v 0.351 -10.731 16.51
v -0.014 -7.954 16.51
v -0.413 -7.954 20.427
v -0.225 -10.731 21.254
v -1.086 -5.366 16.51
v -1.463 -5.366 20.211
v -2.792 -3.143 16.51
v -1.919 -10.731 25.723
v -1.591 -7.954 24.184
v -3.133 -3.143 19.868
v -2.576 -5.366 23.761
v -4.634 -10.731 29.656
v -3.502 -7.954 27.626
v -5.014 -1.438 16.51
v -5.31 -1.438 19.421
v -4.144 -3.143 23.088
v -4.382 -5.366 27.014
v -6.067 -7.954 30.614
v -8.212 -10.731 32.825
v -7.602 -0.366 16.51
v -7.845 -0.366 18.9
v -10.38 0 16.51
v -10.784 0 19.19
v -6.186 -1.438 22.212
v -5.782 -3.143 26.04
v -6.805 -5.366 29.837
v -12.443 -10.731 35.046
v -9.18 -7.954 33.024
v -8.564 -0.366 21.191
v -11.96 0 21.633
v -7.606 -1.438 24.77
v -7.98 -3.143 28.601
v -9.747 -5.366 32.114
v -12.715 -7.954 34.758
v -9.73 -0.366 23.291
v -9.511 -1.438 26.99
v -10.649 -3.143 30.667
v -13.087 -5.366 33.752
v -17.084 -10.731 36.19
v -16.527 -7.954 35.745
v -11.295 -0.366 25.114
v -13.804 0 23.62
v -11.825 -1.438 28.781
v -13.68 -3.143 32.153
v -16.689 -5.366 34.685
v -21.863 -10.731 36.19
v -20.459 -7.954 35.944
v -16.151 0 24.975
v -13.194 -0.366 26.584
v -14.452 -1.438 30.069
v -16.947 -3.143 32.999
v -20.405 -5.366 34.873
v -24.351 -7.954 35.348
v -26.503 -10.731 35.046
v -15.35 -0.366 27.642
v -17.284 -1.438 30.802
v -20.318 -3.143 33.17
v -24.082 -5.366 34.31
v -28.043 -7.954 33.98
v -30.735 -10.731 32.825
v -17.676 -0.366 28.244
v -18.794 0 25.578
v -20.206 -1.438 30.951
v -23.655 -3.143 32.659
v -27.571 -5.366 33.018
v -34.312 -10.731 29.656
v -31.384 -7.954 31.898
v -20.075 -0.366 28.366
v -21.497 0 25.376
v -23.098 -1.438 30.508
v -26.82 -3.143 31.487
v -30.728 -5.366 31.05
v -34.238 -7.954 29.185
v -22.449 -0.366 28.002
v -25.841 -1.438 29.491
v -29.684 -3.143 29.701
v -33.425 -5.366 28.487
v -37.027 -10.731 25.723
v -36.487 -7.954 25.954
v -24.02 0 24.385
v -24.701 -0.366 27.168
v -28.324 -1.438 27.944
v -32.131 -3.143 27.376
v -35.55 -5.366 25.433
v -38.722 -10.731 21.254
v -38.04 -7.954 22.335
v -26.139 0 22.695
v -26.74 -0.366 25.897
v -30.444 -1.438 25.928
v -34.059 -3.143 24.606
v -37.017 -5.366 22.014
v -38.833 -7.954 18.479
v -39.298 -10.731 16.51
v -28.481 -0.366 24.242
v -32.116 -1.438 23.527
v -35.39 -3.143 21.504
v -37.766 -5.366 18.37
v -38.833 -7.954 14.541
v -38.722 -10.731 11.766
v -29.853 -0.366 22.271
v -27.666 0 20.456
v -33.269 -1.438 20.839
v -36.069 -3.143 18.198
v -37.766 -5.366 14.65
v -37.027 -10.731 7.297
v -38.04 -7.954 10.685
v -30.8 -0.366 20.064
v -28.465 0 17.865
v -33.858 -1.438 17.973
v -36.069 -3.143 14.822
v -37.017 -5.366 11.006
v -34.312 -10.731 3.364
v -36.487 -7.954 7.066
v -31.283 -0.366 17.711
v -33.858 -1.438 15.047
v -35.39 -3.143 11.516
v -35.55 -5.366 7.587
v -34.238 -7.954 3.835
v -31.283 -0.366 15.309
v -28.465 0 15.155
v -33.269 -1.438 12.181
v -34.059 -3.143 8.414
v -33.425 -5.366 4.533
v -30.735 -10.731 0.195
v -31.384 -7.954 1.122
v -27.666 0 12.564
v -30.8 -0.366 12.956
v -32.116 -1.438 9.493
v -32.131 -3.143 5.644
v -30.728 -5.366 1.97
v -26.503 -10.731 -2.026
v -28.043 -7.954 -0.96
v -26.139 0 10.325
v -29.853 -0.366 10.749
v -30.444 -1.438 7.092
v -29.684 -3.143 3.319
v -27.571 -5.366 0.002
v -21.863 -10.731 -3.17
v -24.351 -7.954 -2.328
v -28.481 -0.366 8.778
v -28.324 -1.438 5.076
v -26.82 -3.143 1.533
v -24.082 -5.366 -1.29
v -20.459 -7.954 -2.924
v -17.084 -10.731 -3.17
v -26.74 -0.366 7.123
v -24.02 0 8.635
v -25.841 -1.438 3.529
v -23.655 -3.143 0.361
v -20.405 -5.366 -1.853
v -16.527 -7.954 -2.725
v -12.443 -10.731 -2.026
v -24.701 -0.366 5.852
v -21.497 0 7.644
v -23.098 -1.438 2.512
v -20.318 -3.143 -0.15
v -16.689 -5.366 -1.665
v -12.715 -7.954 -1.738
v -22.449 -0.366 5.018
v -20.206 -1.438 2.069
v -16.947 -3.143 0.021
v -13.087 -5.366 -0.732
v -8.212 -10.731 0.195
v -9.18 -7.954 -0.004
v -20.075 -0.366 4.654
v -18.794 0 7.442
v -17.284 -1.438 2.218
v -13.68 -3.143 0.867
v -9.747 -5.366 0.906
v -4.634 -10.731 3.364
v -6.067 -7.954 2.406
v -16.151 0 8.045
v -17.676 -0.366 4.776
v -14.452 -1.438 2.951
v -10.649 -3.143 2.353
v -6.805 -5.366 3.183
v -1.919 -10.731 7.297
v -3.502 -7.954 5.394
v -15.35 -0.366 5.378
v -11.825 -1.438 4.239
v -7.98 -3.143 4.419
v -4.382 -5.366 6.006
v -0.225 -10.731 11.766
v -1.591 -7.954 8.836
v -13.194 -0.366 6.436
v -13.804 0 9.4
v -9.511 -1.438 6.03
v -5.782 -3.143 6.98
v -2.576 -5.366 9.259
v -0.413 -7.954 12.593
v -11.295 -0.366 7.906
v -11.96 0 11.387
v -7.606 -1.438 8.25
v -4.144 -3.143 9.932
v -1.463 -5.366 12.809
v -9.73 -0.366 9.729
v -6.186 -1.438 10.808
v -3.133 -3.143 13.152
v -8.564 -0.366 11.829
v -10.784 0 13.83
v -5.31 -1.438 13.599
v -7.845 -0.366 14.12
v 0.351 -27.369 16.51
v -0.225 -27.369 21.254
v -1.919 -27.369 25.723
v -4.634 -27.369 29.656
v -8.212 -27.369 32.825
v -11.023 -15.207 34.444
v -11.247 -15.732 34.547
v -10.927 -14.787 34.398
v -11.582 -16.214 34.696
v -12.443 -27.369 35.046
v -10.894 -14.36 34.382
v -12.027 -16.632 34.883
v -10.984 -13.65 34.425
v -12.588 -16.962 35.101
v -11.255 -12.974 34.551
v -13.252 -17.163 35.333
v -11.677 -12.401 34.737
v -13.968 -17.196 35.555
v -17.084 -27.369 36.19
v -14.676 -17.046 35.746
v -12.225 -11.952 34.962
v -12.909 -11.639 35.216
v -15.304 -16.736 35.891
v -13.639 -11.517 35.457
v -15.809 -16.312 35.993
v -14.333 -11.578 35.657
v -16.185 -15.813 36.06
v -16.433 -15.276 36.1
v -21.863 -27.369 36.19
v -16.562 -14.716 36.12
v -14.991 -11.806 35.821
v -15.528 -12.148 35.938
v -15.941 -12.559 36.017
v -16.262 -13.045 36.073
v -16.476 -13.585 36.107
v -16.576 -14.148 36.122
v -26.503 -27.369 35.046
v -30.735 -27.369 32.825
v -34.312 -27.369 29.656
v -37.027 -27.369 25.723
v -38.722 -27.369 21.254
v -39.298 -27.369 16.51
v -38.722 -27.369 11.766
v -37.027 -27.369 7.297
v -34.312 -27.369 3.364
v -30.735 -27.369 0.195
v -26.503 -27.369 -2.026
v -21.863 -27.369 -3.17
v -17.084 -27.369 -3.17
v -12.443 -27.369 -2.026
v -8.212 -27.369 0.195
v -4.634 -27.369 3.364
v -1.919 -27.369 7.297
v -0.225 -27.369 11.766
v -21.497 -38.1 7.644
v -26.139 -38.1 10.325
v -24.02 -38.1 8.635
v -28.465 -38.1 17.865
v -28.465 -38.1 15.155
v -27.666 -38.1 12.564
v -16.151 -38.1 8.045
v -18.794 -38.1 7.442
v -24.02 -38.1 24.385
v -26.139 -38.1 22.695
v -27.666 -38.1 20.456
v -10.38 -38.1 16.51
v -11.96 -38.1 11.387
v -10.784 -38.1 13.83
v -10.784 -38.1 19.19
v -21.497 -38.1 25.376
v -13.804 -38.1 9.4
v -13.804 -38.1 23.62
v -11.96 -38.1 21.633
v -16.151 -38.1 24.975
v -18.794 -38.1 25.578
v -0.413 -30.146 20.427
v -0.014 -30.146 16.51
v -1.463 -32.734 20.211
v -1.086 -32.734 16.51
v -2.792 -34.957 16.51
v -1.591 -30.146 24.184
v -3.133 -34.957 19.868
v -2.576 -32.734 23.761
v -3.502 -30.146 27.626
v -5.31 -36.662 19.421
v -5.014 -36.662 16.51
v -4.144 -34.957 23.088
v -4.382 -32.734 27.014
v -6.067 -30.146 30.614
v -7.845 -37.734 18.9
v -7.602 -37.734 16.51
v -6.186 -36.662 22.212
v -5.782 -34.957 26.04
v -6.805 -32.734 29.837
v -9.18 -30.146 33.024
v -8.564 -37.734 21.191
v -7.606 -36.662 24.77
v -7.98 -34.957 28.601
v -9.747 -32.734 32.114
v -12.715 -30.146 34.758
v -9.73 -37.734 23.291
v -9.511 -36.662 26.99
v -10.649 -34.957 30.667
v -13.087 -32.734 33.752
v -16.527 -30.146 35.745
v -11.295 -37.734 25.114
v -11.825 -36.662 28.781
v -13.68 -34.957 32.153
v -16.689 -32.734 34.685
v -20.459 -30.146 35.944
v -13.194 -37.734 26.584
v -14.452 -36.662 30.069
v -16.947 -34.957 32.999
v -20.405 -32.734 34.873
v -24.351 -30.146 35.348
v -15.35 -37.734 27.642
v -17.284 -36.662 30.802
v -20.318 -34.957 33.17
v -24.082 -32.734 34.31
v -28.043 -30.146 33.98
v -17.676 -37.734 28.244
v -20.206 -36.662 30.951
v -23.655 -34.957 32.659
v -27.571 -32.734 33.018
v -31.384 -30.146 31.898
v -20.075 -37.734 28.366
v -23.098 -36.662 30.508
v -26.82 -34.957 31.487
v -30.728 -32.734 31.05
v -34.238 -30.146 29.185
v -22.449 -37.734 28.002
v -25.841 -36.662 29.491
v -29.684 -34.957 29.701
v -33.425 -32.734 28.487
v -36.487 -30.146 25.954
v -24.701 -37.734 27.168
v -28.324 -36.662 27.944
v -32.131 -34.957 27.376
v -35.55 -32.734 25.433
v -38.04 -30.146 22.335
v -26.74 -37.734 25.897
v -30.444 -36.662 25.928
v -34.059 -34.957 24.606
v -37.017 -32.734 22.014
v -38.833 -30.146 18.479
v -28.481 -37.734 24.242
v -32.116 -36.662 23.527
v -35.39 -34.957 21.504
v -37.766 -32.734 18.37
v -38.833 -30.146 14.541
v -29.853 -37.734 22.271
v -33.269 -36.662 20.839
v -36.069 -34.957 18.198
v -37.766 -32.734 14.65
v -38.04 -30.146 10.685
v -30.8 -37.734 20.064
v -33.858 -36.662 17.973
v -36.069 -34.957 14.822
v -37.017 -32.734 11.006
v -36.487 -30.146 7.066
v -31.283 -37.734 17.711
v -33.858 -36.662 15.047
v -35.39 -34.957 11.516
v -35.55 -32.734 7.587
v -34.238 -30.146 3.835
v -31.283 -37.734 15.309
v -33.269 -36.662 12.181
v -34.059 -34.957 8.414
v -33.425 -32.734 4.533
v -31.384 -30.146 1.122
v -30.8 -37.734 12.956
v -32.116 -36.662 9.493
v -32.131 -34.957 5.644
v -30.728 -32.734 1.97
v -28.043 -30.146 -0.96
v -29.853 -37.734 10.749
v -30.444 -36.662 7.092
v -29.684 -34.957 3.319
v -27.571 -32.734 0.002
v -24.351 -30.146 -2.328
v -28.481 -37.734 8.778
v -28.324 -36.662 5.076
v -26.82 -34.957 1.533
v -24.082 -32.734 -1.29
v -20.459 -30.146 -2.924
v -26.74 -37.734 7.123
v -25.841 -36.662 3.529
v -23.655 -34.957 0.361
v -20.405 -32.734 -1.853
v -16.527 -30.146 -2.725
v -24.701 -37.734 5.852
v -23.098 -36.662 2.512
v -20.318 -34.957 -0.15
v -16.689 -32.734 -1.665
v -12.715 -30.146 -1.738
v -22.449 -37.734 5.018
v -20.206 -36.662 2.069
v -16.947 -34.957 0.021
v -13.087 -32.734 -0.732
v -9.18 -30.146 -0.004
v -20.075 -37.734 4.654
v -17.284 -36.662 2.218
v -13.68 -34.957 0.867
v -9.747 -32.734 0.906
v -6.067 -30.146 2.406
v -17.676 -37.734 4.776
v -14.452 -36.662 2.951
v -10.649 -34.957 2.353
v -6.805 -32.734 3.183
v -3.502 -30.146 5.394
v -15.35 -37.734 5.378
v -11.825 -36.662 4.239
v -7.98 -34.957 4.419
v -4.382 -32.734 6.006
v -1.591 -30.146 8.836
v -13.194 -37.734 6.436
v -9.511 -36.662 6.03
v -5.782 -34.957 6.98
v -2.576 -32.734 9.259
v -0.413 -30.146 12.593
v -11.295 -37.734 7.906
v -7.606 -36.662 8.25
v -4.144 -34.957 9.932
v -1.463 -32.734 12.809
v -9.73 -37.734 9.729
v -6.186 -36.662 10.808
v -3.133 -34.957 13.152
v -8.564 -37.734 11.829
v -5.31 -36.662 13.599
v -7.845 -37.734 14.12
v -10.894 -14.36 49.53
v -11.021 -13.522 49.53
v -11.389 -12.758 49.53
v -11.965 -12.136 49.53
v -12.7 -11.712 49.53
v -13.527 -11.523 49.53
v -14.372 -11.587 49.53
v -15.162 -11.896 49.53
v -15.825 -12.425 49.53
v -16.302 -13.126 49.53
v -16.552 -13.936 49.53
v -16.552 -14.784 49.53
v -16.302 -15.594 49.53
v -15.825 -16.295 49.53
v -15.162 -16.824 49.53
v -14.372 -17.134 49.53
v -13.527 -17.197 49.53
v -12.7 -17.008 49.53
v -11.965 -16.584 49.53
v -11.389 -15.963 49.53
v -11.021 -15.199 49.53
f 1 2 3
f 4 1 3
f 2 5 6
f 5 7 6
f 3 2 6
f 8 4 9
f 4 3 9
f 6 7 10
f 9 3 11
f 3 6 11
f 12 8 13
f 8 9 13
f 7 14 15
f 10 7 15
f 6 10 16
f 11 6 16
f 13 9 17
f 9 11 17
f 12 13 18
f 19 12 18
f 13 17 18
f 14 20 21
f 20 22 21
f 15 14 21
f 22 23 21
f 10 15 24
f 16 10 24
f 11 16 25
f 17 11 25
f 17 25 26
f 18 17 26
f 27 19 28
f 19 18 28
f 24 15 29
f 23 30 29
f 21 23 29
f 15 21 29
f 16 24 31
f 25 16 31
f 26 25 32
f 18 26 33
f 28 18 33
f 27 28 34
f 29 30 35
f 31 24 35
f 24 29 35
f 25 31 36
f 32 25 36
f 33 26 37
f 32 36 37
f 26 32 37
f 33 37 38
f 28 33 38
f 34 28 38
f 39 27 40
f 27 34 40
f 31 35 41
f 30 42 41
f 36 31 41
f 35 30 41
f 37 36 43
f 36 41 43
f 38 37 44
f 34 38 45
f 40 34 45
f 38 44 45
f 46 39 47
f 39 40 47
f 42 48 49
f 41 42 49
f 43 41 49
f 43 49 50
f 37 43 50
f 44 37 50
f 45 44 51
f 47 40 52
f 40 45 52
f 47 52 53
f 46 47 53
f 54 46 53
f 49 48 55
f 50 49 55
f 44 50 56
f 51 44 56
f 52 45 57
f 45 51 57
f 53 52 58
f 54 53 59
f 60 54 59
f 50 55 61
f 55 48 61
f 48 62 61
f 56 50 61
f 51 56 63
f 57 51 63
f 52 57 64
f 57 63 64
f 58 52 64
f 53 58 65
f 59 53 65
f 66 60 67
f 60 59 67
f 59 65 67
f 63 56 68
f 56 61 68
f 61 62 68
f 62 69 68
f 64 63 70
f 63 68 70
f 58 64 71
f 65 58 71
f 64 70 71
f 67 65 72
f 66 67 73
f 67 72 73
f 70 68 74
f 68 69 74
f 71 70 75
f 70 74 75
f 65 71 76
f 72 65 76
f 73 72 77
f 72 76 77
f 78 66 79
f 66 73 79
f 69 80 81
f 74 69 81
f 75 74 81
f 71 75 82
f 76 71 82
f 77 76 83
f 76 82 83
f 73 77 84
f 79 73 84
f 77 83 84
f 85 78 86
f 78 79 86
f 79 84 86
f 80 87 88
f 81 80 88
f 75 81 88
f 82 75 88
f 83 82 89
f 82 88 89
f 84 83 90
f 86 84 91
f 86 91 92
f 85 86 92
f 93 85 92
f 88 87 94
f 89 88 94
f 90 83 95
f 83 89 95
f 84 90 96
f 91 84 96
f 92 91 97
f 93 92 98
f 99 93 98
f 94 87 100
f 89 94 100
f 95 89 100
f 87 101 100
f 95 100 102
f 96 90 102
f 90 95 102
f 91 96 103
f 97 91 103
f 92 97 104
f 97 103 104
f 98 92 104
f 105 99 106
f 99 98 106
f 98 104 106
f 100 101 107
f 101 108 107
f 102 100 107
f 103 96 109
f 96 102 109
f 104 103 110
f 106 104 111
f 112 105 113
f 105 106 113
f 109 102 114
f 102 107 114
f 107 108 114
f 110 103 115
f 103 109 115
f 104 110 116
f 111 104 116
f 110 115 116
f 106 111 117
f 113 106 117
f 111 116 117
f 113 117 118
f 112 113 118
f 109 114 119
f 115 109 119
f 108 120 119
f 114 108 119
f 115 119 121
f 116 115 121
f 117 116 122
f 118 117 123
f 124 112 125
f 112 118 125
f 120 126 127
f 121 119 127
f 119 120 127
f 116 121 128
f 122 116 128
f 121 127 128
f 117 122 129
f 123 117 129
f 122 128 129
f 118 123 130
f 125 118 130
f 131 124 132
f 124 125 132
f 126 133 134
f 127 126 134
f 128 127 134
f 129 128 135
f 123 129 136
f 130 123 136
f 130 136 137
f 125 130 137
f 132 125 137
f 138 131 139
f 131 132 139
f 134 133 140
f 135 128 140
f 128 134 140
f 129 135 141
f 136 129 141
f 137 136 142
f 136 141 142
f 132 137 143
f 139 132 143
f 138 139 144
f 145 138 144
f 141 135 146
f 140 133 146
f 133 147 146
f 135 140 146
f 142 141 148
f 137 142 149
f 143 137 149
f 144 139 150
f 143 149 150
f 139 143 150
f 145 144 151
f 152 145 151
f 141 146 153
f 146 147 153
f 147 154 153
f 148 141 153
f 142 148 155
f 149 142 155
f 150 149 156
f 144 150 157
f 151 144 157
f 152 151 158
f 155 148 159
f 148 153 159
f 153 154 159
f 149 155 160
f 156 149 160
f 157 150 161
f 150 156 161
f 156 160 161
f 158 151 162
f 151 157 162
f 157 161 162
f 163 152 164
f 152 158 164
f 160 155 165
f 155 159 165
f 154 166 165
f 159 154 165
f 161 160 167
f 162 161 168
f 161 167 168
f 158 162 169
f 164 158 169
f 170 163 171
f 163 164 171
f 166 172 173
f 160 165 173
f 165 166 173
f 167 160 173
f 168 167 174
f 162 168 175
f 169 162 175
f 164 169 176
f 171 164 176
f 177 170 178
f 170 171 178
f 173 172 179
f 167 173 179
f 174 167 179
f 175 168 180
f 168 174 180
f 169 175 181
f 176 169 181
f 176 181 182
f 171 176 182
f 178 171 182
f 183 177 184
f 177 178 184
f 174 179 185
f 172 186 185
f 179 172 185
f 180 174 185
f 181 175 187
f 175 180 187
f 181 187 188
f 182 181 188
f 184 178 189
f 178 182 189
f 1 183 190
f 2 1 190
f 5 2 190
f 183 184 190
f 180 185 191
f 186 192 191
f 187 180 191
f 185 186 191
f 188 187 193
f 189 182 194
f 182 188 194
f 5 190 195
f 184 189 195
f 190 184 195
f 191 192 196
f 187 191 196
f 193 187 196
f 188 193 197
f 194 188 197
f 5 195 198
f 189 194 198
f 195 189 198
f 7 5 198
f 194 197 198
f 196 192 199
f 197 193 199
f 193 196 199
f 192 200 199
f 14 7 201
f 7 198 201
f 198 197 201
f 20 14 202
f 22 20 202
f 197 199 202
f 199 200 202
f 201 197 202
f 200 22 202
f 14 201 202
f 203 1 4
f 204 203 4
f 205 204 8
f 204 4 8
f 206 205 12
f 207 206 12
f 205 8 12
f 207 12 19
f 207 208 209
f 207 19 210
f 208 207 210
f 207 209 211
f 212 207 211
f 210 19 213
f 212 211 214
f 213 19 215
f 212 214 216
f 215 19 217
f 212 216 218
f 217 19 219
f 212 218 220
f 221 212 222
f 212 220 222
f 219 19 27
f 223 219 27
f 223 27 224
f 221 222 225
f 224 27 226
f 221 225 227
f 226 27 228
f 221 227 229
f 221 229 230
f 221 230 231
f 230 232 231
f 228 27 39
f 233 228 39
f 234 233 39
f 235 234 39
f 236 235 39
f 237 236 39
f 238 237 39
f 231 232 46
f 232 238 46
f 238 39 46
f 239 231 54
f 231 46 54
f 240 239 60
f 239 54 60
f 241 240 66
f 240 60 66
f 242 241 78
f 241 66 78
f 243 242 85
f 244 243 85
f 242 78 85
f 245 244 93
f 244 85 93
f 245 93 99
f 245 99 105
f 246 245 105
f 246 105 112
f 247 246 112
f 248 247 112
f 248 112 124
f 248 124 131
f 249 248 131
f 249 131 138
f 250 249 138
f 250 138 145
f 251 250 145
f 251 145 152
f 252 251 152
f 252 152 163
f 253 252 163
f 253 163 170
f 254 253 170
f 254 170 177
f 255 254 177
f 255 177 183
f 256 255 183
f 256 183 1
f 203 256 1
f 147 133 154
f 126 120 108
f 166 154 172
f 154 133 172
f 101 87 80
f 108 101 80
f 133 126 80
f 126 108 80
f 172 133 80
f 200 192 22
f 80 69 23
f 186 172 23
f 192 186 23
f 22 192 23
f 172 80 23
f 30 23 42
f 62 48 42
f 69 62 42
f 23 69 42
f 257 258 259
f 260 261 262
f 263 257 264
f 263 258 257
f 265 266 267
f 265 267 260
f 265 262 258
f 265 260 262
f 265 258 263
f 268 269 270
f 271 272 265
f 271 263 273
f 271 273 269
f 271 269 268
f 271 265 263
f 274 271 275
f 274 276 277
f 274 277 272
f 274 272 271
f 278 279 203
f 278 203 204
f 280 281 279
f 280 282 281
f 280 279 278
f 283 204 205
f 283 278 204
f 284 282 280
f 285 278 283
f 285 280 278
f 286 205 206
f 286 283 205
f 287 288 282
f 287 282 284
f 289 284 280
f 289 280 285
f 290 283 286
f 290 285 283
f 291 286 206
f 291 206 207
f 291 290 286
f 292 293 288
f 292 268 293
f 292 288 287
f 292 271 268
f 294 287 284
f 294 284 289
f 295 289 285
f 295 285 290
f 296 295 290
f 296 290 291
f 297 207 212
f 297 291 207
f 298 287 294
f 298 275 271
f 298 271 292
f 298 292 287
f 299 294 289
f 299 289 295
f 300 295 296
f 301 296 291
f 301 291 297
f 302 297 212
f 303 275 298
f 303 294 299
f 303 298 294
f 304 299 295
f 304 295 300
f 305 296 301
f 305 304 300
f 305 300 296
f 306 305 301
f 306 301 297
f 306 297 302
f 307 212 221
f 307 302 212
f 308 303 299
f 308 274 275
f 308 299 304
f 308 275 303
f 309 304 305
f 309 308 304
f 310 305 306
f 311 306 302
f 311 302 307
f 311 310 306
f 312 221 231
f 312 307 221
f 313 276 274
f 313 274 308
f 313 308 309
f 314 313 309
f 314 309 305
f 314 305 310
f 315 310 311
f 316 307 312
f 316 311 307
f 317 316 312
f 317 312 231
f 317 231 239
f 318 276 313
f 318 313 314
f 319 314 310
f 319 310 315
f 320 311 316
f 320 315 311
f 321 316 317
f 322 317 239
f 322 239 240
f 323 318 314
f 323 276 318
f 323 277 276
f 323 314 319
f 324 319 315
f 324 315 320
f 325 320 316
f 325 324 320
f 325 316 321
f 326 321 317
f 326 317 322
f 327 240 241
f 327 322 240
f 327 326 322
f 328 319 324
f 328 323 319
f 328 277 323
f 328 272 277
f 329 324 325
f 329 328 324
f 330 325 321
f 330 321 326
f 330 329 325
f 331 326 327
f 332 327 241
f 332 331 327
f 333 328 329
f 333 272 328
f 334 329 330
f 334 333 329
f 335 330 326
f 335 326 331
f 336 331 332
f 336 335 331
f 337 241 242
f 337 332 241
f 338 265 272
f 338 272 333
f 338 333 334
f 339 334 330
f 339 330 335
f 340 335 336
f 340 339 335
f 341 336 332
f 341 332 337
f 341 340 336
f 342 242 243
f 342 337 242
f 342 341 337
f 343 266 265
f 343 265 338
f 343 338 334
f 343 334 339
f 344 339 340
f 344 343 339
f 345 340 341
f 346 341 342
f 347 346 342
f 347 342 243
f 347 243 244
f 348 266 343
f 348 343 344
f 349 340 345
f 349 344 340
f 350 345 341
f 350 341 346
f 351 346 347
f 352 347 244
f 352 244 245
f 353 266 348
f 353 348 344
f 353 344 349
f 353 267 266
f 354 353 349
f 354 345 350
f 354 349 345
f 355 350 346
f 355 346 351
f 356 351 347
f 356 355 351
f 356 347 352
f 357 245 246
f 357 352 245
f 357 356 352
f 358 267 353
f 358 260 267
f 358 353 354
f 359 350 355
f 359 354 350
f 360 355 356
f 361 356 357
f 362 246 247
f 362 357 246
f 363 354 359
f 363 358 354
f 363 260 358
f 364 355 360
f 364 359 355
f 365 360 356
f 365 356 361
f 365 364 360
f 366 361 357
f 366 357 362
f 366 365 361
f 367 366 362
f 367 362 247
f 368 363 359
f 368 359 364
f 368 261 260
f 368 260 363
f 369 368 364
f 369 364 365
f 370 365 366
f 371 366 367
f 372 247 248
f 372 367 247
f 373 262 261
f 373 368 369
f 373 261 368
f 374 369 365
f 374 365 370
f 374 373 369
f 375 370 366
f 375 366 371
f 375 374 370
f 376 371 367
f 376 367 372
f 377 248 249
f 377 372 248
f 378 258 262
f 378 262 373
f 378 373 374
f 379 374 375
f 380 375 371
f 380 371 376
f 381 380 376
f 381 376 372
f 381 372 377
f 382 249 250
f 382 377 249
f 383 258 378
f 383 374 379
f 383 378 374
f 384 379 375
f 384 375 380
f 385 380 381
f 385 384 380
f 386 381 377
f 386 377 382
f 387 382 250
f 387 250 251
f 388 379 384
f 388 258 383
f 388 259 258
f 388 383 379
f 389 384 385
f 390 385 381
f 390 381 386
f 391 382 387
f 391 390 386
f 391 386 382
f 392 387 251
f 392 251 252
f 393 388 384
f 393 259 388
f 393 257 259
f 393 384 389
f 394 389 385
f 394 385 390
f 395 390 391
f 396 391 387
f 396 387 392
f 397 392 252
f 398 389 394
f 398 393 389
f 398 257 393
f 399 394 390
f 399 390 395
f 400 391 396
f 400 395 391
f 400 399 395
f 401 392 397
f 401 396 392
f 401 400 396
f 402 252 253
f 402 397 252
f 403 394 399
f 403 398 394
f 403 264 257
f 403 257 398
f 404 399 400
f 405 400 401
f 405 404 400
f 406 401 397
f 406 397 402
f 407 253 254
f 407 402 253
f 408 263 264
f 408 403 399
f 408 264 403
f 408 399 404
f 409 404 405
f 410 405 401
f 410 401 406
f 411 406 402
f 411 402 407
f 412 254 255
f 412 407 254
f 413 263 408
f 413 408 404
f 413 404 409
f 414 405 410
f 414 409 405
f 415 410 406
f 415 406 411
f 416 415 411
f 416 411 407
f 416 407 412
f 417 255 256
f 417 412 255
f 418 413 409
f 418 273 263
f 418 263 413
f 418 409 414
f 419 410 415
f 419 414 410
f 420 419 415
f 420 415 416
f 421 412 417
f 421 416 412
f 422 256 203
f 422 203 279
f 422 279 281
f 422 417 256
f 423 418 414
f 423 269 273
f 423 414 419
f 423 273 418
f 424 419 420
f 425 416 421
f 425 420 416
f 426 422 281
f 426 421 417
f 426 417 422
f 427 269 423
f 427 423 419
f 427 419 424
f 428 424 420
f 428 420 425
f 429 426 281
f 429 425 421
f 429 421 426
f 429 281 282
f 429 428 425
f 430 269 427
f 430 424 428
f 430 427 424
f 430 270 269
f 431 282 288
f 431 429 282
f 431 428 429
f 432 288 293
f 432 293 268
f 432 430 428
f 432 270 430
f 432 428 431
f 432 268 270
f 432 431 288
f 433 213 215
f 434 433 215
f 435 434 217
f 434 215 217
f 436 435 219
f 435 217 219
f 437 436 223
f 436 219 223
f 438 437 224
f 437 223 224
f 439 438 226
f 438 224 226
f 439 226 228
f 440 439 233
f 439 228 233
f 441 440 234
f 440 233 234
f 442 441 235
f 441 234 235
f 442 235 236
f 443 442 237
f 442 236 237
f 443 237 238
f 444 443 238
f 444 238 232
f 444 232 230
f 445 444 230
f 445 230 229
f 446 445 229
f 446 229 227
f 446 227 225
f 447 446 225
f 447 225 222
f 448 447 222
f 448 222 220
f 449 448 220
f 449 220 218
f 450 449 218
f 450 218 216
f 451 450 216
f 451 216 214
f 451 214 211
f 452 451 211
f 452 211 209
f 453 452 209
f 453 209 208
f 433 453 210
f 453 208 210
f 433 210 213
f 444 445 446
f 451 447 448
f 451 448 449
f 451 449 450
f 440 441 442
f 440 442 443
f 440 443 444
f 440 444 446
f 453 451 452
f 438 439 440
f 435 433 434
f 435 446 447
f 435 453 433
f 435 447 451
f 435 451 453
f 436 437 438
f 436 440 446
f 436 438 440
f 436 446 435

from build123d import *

# Parameters (mm, degrees)
F0_R     = 19.8247
F1_DEPTH = 38.1
F2_R     = 10.731179
F3_R     = 2.8448
F4_DEPTH = 49.53


with BuildPart() as f1:
    # F0 (on Front) → F1 (new body)
    with BuildSketch(Plane.XZ):
        with Locations((-19.473333, 16.51)):
            Circle(F0_R)
    extrude(amount=F1_DEPTH)

    # F2
    f2_edges = [f1.edges().sort_by_distance(p)[0] for p in [
        (-39.298033, -38.1, 16.51),
        (-39.298033, 0, 16.51),
    ]]
    fillet(f2_edges, radius=F2_R)

    # F3 (on Top) → F4 (join)
    with BuildSketch(Plane.XY):
        with Locations((-13.739159, -14.360067)):
            Circle(F3_R)
    extrude(amount=F4_DEPTH)


solid = f1.part
